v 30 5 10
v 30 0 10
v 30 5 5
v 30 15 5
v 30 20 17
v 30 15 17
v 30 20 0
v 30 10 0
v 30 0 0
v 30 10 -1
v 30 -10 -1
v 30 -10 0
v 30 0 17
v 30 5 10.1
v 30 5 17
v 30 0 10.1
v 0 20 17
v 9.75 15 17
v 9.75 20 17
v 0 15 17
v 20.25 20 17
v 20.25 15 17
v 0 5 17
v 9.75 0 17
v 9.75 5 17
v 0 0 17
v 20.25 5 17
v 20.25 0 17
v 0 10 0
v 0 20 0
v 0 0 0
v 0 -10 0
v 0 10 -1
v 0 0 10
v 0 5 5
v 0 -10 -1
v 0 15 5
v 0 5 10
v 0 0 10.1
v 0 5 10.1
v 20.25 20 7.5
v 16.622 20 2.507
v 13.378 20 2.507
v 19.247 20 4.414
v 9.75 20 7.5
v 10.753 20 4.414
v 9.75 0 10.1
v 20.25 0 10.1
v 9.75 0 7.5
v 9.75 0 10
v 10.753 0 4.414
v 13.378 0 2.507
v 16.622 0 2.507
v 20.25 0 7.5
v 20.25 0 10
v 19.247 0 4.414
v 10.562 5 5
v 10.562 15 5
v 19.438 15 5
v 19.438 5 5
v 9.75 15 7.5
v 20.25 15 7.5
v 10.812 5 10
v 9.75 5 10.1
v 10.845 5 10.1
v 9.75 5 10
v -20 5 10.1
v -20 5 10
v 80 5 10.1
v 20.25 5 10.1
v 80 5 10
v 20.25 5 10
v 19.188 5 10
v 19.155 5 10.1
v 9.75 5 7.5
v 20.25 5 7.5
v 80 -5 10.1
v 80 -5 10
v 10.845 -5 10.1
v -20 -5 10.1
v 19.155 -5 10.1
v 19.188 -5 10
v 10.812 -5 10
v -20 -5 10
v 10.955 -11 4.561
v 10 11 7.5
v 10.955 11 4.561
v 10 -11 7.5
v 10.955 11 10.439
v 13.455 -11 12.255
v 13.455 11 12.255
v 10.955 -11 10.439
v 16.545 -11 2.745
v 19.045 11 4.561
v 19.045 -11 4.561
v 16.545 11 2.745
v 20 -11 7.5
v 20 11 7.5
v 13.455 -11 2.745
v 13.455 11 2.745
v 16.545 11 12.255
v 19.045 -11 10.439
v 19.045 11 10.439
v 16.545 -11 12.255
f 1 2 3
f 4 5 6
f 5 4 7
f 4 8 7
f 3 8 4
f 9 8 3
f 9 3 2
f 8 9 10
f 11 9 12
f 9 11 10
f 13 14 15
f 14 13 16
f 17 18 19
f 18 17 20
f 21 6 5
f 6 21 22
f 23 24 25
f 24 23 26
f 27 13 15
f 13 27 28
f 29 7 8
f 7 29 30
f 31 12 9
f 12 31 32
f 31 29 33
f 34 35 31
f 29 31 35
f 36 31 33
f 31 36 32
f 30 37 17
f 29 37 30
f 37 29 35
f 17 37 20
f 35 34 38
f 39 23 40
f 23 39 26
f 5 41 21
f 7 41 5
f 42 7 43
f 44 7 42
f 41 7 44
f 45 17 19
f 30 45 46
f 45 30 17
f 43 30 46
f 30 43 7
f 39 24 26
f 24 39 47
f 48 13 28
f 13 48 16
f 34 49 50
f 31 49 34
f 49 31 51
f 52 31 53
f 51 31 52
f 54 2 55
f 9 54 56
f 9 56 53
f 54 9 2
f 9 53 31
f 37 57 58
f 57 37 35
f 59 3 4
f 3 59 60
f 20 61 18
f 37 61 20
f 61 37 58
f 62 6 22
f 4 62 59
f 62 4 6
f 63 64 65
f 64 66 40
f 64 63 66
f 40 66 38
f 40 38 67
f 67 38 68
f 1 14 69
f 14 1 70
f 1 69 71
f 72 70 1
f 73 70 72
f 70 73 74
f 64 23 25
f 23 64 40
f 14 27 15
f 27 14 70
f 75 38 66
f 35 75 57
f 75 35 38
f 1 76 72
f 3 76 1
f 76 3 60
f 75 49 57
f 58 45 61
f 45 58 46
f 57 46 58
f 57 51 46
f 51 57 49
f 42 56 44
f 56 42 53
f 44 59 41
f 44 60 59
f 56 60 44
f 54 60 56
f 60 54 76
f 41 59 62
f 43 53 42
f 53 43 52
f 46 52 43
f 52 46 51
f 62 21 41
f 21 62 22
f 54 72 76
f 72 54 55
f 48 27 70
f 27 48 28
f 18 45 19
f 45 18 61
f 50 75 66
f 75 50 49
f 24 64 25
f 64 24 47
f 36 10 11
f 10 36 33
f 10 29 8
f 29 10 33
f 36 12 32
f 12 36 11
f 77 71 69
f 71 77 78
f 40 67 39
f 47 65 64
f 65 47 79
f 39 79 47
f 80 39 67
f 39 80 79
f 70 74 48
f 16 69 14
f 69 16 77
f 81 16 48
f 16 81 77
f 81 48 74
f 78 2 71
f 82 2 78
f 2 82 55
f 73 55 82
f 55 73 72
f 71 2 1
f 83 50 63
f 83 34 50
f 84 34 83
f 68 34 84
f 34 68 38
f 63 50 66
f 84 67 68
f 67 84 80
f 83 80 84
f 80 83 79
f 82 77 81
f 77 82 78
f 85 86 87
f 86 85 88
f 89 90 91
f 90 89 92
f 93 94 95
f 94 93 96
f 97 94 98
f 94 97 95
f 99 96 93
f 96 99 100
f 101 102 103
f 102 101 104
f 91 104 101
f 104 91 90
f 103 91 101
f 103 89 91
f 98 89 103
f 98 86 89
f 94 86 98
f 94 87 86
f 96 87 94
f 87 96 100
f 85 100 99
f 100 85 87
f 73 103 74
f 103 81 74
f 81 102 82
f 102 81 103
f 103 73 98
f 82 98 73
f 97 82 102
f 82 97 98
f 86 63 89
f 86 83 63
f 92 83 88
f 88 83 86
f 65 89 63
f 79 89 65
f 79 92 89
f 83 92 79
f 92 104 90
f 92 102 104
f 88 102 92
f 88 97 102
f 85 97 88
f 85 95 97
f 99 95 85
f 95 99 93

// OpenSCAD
// a window stopper with rotating wedge
// (all sizes in millimeter)

module window_stopper(

    /* parameters */
    
    // for window
    window_thickness = 10,   // thickness of window frame
    windowsill_dist = 10,        // distance between window and windowsill
    // for window_stopper
    windowsill_adj = 1,     // adjustment for windowsill distance
    stopper_width = 30,     // width of the stopper
    material_thickness = 5,     // material thickness of the stopper
    window_overlap = 7,     // overlap of stopper and window
    axle_dm = 10,       // axle diameter
    axle_clearance = 0.5,       // axle clearance towards bushing
    // for stopper
    wedge_start_r = 0,      // wedge start radius
    wedge_end_r = 11,      // wedge end radius
    wedge_angle = 42,       // start angle of wedge
    lever_depth = 15,       // depth of lever
    lever_length = 40,      // length of lever
    lever_angle = 15,       // start angle of lever
    
) {
    
    $fn = 10;
    
    axle_height =
        material_thickness + (windowsill_dist - material_thickness) / 2;
    
    module window() {
        color("LightSkyBlue")
            translate( [ -20, -window_thickness / 2, windowsill_dist])
                cube( [100, window_thickness, 0.1]);
        }
    
    module stopper_case() {
        case_size = [
            stopper_width,
            window_thickness + material_thickness * 2,
            windowsill_dist + window_overlap
        ];
        
        difference() {
            cube( case_size );
            axle_bushing = axle_dm + axle_clearance;
            
            translate( [-1, material_thickness, material_thickness] )
                cube( [case_size.x + 2, window_thickness, case_size.z] );
            
            translate( [case_size.x / 2, -1, axle_height] )
                rotate( [-90,0.0])
                    cylinder( d = axle_bushing, h = case_size.y + 2);
            
            translate( [(case_size.x - axle_bushing) / 2, -1, axle_height] )
                cube( [axle_bushing, case_size.y + 2, case_size.z] );
        }
        
        translate( [0, -case_size.y / 2, -windowsill_adj] )
            cube( [case_size.x, case_size.y, windowsill_adj] );
        
        }
    
    module stopper( angle = 0 ) {
        axle_length = window_thickness + material_thickness * 2 + 2;
        
        translate( [stopper_width / 2, -axle_length / 2, axle_height] )
            rotate( [ -90, 0, 0] )
                cylinder( d = axle_dm, h = axle_length );
        }
    
    window();
    stopper_case();
    stopper();
    
}

window_stopper( /* parameters */ );
